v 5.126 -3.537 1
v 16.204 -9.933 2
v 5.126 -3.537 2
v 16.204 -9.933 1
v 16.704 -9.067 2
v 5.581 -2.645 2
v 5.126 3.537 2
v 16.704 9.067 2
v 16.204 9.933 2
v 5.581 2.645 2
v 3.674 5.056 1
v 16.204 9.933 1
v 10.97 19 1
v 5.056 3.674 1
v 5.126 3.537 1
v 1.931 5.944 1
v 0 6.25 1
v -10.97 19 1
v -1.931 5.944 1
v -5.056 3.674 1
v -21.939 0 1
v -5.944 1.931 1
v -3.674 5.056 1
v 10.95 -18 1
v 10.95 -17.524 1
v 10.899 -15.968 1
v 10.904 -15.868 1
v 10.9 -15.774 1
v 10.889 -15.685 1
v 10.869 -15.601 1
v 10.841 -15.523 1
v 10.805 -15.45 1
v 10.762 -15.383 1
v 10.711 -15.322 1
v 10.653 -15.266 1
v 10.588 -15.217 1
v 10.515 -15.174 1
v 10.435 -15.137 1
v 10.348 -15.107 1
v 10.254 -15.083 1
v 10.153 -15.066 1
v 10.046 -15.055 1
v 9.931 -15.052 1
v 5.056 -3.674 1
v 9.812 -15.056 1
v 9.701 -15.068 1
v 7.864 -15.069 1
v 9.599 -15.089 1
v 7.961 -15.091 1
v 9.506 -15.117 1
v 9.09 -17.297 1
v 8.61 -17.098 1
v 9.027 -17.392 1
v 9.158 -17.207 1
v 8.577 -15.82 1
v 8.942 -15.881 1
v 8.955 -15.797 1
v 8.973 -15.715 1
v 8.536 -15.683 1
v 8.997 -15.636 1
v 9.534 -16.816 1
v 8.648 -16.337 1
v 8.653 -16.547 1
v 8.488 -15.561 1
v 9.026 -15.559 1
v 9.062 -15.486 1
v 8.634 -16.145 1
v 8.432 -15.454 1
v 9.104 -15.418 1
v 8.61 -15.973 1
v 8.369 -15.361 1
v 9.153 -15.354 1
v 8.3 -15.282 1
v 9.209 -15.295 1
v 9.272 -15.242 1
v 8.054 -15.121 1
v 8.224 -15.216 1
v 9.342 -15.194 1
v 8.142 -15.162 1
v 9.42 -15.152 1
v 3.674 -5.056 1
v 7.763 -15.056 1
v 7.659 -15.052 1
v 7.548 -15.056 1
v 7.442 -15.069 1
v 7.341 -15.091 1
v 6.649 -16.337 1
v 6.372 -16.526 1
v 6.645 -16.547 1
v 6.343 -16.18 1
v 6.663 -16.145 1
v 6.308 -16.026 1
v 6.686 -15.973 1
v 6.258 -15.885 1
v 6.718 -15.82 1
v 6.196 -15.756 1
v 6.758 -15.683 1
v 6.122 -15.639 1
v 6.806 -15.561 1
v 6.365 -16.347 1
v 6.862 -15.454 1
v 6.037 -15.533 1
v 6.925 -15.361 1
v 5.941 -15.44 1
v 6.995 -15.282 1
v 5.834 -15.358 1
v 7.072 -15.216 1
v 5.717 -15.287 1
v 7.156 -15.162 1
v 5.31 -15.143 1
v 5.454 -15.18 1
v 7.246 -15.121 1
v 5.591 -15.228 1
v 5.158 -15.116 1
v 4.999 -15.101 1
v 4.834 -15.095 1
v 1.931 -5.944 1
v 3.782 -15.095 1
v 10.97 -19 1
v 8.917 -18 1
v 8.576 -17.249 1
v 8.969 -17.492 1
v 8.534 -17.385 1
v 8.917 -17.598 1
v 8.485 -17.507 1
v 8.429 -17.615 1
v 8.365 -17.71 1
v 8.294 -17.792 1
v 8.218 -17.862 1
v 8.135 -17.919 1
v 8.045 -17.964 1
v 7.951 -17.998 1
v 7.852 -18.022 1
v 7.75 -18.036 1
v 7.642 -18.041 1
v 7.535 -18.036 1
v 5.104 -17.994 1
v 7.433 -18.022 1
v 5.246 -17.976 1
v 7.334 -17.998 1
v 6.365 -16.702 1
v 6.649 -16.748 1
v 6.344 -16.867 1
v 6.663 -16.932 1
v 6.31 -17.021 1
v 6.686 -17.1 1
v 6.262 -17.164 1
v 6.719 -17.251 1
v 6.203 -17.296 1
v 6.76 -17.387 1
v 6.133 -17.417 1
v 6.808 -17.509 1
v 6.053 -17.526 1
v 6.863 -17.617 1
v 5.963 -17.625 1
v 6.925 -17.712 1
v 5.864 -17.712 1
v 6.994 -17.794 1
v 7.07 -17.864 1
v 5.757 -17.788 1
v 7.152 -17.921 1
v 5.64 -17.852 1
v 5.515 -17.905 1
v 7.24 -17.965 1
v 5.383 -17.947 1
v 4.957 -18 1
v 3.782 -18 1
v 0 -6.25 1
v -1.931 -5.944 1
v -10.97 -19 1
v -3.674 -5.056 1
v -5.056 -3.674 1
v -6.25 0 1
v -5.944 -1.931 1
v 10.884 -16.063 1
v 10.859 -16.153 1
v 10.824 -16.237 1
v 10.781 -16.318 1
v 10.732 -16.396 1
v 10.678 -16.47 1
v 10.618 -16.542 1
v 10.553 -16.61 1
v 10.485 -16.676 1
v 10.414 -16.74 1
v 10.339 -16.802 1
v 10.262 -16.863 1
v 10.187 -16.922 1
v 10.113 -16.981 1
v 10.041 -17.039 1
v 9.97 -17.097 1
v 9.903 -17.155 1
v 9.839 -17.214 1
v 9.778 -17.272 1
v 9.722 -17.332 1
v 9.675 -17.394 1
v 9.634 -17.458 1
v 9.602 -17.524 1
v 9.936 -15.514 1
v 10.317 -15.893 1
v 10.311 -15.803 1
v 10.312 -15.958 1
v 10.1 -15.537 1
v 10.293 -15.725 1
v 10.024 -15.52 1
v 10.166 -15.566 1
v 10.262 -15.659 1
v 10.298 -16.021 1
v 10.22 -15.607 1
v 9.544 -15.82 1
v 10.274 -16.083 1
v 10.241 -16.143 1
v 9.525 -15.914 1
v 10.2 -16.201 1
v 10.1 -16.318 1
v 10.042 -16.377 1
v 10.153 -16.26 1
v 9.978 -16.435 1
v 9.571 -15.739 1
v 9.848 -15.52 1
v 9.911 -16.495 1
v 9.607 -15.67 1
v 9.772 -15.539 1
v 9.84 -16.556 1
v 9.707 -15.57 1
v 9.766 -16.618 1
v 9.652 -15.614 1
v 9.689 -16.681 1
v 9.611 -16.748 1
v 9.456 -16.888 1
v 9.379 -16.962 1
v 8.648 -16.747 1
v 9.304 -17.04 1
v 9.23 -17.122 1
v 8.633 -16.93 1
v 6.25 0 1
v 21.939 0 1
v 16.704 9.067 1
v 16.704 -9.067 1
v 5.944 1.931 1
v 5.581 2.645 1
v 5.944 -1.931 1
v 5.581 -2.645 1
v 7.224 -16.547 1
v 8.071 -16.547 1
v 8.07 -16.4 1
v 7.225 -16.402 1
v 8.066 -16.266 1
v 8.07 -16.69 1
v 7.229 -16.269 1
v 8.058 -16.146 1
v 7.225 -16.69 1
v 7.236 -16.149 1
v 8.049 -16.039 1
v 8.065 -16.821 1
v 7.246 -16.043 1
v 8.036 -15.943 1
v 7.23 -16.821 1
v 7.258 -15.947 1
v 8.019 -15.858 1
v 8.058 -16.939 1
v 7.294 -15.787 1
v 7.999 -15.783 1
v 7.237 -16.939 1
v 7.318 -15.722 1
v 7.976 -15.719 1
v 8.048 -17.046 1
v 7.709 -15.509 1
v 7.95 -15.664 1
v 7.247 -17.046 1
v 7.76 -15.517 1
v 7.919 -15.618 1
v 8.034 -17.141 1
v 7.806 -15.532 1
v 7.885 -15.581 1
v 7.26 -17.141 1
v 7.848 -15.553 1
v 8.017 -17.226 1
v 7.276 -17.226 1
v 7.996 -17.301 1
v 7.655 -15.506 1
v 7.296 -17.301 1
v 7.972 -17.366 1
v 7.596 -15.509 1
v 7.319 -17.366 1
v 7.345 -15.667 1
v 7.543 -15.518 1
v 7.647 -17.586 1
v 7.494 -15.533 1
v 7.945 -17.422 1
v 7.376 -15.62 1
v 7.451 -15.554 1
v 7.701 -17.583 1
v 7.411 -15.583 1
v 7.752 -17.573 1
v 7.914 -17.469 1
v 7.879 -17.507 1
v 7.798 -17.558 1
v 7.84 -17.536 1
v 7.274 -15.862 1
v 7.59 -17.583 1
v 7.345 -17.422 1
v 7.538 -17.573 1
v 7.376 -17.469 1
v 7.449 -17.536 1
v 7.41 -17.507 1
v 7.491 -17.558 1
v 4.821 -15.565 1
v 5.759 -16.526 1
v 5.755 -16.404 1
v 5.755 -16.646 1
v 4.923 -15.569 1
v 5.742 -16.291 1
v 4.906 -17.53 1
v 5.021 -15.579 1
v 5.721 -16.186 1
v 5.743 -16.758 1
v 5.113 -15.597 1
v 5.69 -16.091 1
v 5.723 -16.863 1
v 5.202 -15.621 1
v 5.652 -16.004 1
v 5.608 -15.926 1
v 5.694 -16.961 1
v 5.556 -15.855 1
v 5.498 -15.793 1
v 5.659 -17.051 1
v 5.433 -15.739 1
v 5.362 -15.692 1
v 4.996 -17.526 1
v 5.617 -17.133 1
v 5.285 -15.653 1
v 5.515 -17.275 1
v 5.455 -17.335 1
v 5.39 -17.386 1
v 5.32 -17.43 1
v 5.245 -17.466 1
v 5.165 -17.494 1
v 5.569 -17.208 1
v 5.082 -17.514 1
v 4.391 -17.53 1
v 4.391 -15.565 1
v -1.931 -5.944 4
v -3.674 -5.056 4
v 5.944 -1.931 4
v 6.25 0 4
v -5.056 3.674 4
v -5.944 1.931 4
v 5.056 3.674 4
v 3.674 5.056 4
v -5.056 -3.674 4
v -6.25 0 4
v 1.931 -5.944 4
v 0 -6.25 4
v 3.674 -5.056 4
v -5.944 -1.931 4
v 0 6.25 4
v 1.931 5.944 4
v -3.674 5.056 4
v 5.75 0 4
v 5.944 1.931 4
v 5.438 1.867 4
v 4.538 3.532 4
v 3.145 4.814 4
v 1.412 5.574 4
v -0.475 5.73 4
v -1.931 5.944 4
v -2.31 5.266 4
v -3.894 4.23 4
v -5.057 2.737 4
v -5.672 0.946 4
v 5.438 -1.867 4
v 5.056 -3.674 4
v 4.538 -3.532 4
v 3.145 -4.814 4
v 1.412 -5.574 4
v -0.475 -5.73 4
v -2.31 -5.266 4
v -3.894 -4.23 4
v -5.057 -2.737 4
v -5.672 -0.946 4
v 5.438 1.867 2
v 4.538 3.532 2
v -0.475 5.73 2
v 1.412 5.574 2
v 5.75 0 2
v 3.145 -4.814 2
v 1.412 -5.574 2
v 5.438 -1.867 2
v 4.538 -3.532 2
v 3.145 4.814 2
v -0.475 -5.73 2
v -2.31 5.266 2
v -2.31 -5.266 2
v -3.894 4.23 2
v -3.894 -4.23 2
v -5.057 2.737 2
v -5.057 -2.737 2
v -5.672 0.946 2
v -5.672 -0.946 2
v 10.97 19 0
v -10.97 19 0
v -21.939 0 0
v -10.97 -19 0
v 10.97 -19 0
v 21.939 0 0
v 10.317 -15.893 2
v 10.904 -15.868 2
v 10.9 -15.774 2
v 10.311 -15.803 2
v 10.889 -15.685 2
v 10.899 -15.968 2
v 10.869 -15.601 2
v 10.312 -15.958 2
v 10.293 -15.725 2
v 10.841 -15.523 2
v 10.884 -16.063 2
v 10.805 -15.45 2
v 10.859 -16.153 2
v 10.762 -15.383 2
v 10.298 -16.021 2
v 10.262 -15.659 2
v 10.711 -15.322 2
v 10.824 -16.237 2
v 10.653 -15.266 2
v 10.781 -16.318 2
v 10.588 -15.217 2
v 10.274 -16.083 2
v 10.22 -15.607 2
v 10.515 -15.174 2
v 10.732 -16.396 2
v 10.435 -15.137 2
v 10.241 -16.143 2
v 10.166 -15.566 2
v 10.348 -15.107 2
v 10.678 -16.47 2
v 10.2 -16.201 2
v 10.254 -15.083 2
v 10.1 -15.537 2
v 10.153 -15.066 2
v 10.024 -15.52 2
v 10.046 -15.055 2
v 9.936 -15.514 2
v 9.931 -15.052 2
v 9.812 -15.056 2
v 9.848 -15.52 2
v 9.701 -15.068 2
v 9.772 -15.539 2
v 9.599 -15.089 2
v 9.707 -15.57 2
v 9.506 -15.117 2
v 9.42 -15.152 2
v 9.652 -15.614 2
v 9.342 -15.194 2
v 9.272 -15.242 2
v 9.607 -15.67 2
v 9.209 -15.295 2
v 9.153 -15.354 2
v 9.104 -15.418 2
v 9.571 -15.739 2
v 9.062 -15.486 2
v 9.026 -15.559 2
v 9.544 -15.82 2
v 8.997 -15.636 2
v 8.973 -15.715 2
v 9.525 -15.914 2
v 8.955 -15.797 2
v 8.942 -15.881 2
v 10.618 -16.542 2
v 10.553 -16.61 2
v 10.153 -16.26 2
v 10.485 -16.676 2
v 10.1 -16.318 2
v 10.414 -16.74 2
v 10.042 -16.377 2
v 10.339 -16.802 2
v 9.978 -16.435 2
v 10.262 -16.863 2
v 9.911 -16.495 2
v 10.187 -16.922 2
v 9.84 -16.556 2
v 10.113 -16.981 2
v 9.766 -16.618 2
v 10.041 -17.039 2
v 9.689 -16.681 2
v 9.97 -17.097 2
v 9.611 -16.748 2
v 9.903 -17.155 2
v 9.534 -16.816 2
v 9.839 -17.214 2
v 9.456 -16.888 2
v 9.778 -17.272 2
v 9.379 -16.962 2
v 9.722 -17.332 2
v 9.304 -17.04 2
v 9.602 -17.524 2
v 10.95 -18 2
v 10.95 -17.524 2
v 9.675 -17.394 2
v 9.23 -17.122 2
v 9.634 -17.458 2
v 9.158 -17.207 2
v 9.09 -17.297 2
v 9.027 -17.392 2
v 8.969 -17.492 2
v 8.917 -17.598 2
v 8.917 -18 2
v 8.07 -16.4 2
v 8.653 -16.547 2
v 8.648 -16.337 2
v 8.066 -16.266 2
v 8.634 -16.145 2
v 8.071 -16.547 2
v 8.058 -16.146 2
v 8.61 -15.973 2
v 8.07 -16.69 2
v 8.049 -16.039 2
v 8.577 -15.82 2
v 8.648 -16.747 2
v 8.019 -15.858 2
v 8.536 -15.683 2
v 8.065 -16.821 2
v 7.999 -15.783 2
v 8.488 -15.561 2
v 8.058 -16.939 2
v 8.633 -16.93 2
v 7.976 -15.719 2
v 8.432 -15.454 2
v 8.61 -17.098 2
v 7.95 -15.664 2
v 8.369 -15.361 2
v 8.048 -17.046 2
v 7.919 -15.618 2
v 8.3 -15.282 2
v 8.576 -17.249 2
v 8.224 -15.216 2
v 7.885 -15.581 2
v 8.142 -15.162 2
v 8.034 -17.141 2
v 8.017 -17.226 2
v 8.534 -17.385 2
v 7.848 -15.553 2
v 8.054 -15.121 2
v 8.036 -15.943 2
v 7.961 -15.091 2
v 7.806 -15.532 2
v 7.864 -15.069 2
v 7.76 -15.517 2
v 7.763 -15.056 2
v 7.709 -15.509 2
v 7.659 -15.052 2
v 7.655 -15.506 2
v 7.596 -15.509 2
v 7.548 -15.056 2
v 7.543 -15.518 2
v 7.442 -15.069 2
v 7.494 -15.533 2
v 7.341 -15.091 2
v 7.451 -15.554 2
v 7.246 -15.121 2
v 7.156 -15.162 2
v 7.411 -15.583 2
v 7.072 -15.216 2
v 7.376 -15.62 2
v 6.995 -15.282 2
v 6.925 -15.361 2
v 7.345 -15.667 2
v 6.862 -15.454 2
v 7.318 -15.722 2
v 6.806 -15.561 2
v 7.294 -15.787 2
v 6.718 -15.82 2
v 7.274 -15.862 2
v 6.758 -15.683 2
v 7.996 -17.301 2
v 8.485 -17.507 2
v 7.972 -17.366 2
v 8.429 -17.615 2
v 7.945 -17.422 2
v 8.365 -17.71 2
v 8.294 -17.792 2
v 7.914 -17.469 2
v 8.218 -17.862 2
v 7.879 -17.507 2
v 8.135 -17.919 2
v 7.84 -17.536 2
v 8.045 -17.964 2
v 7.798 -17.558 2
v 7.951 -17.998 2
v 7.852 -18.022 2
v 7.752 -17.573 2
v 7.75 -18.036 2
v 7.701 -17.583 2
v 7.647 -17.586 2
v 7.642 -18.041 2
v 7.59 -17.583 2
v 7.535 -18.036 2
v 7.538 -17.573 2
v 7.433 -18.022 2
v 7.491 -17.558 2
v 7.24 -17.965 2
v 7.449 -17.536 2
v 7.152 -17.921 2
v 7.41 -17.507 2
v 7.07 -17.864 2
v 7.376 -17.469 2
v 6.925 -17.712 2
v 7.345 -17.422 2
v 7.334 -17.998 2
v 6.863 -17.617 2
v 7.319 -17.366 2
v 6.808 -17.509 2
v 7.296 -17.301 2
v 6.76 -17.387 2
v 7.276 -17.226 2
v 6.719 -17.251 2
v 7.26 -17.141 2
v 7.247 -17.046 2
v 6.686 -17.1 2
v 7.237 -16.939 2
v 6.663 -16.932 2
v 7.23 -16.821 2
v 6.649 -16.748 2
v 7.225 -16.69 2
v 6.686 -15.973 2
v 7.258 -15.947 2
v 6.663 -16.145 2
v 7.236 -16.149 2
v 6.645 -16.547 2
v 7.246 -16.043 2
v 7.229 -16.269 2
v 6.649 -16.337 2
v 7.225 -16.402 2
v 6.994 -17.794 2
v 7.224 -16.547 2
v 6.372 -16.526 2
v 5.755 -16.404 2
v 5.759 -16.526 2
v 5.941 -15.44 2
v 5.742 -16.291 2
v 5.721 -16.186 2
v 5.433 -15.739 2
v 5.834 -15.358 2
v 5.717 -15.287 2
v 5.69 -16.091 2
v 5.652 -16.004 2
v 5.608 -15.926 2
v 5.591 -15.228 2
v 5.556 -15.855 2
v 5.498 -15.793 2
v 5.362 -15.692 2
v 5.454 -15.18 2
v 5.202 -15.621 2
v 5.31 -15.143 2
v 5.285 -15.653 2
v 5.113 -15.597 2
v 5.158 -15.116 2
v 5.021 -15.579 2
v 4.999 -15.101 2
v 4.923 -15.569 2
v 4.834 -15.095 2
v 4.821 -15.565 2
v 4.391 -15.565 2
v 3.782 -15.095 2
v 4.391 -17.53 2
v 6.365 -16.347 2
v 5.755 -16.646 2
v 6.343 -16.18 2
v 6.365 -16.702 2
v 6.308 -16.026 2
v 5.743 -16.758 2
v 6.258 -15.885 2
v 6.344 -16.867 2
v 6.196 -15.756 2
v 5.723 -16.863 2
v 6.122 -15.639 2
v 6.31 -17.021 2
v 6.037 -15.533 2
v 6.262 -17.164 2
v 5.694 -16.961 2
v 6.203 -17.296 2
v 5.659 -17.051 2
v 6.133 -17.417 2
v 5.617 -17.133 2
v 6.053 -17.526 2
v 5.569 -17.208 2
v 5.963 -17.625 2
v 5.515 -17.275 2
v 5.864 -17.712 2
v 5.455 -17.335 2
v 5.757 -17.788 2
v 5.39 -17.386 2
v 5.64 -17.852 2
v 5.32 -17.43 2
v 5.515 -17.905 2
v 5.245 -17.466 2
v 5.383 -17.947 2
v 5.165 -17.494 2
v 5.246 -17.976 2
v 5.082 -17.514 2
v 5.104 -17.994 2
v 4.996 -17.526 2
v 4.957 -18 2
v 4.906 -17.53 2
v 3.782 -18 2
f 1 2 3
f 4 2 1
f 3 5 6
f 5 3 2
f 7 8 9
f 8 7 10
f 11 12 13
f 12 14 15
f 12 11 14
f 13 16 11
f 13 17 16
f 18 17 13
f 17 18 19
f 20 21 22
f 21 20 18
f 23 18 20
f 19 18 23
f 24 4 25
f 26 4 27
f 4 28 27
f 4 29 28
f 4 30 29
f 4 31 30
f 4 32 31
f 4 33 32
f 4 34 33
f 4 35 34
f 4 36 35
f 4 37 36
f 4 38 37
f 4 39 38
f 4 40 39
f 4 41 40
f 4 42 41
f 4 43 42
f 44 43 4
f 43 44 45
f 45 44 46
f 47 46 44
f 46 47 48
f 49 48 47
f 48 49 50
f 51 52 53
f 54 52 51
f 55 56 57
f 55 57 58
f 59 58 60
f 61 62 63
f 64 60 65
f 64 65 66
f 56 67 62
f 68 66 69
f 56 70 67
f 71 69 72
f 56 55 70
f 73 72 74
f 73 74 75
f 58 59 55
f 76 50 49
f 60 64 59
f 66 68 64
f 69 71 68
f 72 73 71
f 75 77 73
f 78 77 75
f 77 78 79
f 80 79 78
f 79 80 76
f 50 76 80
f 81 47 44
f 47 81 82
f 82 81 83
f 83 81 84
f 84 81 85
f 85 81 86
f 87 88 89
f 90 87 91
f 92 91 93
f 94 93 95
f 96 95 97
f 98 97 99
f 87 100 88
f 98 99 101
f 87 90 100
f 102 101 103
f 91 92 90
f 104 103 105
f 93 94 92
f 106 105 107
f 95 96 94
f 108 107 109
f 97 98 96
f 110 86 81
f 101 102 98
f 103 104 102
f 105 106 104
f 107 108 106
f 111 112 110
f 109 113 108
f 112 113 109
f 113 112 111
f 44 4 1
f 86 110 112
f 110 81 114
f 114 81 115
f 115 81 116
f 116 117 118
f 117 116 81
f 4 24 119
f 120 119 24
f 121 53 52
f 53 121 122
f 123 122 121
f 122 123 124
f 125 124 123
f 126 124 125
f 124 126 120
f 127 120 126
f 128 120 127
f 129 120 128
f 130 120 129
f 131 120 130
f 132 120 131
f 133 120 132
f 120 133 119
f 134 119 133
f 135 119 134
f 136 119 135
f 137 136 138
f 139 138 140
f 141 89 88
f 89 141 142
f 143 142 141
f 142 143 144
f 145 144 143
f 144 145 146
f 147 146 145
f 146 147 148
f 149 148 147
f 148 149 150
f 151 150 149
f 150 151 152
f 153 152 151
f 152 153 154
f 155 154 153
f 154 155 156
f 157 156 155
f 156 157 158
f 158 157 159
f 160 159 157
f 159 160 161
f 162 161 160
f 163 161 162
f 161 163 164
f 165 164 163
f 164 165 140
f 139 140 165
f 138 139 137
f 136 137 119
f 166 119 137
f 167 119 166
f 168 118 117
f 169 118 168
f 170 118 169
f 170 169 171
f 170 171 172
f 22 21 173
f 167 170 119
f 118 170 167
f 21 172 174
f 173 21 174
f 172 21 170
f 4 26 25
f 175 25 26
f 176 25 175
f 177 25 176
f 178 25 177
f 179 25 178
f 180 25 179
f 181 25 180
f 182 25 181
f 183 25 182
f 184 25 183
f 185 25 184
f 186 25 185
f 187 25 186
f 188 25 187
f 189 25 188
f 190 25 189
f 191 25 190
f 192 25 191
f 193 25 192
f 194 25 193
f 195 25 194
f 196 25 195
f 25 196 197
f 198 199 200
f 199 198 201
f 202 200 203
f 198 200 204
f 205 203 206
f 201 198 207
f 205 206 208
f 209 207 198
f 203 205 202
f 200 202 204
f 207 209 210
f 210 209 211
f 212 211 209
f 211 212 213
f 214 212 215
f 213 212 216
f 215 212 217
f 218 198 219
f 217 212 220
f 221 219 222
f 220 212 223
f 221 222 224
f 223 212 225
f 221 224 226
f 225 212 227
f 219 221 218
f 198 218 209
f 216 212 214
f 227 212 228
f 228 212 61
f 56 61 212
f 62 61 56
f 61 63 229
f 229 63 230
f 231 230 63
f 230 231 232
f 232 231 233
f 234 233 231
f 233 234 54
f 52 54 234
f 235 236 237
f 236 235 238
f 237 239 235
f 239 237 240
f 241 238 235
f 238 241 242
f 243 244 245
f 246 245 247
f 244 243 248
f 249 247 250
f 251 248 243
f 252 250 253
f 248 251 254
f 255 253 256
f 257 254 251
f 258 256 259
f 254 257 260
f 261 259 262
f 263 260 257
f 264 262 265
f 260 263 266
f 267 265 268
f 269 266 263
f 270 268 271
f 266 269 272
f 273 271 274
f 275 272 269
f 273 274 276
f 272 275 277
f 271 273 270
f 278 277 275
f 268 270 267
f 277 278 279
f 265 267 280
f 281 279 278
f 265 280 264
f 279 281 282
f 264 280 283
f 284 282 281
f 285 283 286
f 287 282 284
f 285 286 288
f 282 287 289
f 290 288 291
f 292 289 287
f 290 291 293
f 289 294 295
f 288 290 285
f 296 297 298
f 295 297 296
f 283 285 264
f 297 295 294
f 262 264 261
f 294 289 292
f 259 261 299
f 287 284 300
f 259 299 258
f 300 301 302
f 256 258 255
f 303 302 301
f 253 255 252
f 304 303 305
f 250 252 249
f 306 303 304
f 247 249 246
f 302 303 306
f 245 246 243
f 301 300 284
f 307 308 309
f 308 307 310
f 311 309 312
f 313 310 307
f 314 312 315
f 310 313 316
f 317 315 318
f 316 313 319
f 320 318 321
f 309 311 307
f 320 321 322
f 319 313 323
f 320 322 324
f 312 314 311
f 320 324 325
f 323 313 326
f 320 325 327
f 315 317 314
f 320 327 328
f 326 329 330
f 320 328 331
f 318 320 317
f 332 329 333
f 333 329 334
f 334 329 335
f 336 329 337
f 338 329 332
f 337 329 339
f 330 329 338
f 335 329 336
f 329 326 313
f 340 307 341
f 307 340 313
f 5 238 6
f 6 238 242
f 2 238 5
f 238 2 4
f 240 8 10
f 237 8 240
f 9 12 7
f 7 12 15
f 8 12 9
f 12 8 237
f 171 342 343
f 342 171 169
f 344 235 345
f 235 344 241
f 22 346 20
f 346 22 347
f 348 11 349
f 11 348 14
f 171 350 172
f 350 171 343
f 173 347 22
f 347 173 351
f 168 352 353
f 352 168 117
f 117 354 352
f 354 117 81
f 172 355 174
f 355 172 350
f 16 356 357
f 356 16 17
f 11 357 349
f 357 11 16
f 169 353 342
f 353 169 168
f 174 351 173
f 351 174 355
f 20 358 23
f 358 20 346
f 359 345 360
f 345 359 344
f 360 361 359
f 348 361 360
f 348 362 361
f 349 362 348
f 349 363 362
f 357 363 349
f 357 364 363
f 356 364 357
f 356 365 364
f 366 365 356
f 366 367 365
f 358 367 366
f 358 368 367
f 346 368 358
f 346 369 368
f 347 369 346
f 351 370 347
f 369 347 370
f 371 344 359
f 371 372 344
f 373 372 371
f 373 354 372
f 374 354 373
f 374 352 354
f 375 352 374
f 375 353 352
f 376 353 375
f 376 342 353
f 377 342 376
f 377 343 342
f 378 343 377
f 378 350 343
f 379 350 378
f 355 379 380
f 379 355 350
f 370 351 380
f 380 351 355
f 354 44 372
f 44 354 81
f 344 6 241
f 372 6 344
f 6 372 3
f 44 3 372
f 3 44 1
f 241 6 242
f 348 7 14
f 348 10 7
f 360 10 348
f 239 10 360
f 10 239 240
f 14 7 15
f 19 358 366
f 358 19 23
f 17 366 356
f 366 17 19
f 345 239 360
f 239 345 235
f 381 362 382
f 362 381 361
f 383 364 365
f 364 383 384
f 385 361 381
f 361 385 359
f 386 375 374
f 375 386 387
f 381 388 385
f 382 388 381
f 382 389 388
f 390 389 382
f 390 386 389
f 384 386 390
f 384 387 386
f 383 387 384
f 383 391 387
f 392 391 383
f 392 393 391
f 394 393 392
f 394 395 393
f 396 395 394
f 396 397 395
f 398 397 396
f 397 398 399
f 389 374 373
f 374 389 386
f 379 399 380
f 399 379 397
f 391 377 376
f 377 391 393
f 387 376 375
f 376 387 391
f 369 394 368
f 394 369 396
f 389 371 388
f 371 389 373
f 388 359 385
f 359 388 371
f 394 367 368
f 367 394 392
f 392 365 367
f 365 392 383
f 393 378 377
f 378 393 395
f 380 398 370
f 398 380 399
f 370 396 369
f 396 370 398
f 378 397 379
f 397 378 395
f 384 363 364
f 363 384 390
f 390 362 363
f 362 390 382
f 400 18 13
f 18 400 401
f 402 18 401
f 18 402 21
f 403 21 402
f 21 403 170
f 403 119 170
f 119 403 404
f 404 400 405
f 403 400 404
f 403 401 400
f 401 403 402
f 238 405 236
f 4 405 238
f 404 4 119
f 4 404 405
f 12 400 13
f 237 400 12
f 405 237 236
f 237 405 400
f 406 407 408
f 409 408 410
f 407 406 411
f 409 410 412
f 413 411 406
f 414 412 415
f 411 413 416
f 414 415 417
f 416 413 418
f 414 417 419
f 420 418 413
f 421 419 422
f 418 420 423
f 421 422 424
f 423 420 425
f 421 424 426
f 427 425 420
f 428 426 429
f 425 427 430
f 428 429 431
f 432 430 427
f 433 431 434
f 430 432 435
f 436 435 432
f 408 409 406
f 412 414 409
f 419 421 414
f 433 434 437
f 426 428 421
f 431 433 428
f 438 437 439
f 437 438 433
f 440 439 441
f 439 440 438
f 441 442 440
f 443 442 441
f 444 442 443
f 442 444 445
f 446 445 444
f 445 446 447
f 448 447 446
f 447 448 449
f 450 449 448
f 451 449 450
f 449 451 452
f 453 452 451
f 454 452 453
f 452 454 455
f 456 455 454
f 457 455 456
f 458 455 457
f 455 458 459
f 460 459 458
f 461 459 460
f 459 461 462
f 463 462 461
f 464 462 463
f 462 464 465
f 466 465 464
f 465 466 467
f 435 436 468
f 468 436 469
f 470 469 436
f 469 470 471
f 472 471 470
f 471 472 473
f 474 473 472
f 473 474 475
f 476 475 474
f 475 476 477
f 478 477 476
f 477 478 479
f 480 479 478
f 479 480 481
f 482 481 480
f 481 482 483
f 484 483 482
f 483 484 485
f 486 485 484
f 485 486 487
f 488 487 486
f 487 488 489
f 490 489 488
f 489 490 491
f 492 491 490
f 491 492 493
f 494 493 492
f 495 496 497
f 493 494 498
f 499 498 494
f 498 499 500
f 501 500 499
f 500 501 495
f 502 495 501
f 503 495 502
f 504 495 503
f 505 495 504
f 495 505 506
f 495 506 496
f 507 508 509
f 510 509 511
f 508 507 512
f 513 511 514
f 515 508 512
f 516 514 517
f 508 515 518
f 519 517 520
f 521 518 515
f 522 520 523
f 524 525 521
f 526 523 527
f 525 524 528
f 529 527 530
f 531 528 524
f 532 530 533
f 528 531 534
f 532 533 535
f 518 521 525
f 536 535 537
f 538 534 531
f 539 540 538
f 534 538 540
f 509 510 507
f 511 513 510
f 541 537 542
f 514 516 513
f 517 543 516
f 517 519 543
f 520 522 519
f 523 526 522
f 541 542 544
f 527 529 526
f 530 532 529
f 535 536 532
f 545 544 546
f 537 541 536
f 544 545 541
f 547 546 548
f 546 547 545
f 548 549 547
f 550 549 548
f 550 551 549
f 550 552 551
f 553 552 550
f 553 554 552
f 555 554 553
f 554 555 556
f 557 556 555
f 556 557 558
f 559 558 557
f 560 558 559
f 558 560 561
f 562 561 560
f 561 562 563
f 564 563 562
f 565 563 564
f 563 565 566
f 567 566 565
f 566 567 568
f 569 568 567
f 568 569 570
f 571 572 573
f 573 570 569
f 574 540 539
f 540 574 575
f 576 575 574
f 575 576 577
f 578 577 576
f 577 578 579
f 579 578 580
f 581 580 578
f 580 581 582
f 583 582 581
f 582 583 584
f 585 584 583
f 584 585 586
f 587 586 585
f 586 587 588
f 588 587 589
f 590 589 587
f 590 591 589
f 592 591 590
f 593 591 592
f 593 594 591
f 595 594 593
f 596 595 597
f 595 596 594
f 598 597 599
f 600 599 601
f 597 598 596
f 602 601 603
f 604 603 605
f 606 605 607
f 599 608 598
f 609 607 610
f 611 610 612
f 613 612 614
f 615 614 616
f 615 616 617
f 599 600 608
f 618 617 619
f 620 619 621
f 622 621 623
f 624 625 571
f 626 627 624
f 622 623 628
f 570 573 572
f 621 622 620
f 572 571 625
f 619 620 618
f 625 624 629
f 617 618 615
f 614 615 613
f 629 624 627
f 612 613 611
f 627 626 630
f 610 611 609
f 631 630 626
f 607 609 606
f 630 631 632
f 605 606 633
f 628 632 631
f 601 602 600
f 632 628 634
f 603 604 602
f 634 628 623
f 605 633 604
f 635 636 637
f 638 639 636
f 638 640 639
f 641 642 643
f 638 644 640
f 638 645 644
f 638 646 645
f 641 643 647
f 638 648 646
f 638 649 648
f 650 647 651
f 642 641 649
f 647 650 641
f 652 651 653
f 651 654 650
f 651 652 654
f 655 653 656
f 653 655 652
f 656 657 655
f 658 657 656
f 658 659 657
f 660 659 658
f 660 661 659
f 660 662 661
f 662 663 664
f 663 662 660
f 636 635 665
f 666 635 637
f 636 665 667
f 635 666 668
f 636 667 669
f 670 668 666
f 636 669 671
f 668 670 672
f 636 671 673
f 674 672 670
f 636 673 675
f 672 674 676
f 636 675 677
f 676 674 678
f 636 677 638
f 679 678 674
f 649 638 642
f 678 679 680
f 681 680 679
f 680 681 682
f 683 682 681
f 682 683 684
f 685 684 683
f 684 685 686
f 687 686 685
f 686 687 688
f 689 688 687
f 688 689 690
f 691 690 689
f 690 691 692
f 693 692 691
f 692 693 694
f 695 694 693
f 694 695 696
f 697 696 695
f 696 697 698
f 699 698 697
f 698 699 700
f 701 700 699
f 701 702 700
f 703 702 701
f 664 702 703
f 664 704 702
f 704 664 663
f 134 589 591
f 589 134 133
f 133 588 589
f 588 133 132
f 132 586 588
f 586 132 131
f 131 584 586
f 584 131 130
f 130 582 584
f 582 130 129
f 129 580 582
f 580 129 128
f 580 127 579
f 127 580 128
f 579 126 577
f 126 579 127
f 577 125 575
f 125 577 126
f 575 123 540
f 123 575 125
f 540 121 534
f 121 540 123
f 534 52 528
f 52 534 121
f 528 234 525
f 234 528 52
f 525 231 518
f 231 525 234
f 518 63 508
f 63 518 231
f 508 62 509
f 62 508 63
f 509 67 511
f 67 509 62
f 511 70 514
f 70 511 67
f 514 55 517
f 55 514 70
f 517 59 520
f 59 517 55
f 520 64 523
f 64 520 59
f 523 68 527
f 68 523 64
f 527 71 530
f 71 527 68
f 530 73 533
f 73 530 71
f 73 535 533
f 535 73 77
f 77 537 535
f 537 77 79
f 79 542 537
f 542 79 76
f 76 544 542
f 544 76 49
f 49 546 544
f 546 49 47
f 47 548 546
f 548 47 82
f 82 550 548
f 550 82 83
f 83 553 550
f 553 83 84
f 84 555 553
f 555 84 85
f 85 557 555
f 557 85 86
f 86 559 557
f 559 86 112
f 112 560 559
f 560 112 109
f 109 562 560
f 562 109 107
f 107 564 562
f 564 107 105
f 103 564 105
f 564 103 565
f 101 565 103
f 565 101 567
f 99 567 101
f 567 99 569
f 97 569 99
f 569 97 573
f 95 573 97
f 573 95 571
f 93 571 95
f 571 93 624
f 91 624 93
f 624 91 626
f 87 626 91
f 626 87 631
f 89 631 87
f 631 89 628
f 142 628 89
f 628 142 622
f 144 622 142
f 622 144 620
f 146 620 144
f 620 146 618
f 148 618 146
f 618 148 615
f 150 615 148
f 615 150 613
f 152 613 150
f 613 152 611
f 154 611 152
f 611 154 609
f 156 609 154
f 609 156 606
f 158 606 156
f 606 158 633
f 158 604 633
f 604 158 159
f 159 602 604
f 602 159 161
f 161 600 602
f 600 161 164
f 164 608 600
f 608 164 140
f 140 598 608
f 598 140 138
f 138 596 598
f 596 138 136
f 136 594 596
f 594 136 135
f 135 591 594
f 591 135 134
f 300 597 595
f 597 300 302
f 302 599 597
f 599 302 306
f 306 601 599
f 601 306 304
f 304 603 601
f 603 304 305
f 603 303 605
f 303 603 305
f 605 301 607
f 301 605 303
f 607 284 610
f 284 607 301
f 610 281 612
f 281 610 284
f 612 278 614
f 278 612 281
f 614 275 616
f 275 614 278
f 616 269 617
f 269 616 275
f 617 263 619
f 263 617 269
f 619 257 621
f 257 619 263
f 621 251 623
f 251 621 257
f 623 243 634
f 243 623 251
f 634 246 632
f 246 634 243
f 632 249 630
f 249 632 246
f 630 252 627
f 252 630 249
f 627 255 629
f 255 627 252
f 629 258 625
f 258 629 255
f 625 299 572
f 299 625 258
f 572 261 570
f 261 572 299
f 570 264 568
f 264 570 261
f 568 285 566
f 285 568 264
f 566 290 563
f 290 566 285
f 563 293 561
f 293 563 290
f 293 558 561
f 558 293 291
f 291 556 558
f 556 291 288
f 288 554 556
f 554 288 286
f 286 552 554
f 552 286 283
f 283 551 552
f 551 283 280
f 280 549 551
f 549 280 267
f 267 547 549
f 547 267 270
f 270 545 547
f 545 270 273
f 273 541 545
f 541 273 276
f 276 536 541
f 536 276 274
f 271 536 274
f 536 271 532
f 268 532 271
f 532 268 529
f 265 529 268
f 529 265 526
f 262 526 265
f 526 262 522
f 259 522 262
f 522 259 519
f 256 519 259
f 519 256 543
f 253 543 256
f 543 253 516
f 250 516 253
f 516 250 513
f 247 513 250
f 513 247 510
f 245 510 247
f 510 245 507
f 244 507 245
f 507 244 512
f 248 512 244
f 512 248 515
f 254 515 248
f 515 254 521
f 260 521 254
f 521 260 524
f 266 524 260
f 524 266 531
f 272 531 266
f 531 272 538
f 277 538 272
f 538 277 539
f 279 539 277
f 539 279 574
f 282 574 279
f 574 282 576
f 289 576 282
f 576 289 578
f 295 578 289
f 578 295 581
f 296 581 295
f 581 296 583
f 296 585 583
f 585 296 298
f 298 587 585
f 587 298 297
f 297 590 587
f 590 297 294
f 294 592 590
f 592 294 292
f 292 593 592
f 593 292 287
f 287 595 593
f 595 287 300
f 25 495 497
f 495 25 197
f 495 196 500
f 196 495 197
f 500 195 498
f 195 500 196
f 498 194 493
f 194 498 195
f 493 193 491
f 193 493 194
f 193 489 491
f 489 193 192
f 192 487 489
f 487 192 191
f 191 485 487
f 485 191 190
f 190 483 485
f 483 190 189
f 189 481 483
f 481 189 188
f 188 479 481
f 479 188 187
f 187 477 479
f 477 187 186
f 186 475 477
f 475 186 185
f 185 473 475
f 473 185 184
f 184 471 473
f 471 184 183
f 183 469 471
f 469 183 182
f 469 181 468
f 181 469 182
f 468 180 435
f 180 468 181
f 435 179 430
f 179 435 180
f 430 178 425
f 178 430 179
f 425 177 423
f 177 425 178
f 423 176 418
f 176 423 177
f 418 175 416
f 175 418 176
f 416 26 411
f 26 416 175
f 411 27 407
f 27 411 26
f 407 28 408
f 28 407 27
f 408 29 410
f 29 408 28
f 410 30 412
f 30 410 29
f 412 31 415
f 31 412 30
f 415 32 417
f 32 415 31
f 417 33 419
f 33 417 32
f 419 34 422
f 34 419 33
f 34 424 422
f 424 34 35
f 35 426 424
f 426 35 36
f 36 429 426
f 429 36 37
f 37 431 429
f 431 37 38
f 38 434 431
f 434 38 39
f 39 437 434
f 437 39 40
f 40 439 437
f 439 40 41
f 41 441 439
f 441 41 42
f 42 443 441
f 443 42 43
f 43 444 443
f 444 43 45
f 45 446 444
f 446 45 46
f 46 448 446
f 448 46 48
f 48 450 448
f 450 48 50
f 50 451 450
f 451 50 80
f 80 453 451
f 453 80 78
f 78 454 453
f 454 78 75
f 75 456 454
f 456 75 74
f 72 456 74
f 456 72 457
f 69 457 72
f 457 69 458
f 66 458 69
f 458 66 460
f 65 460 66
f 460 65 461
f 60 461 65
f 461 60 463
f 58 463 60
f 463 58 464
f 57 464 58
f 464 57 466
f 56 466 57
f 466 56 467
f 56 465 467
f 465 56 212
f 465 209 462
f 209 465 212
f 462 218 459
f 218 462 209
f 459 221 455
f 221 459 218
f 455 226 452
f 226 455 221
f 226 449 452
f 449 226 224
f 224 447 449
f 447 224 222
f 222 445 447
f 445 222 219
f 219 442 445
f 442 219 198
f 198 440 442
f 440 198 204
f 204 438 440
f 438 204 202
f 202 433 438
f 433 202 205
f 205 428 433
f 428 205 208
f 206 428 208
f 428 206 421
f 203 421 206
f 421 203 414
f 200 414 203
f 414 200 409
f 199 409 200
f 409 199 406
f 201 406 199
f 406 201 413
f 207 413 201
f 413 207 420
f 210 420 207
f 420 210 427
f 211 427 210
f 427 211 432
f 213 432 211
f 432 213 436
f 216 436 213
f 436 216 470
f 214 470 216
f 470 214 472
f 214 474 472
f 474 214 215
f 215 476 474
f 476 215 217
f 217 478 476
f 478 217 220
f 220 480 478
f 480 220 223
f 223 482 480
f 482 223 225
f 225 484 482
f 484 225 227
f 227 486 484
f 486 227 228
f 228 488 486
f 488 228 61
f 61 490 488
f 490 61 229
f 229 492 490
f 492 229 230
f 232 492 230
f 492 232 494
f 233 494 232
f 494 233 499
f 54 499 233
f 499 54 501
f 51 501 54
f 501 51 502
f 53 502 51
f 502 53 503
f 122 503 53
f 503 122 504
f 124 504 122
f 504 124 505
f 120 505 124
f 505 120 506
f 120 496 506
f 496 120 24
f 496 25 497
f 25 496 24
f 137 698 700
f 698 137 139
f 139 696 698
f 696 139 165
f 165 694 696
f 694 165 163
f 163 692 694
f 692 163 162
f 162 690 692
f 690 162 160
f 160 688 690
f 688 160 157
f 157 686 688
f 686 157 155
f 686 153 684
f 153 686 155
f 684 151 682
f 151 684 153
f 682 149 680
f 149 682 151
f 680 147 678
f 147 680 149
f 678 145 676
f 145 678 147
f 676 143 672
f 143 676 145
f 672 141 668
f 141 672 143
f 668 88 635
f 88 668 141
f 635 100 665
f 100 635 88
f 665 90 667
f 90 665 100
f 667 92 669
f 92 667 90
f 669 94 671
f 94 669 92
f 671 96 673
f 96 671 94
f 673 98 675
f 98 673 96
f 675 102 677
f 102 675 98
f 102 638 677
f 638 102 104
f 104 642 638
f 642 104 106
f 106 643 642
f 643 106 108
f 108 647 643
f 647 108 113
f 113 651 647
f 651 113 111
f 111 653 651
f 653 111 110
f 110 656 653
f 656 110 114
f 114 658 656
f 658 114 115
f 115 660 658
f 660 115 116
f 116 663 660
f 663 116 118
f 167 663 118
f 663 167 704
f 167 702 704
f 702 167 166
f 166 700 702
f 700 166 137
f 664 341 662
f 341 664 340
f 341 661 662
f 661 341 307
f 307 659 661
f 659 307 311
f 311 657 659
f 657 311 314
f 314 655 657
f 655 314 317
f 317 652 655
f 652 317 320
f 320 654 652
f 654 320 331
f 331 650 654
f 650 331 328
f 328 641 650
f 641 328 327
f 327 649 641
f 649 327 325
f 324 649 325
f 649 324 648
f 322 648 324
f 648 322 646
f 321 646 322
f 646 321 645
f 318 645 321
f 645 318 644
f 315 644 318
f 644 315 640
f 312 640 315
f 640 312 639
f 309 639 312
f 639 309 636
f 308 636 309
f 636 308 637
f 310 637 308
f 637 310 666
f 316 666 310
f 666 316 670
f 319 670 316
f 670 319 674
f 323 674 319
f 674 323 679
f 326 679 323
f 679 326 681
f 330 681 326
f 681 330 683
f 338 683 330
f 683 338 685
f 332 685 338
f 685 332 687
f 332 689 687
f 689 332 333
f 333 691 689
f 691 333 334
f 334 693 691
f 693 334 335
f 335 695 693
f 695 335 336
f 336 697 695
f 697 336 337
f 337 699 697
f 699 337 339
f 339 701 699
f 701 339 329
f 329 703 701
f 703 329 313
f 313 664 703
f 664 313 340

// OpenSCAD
include <../../Scripts/18xx tiles basic functions.scad>
hex("Blue");
single_city([4,5]);
put_tilenr("D02");
